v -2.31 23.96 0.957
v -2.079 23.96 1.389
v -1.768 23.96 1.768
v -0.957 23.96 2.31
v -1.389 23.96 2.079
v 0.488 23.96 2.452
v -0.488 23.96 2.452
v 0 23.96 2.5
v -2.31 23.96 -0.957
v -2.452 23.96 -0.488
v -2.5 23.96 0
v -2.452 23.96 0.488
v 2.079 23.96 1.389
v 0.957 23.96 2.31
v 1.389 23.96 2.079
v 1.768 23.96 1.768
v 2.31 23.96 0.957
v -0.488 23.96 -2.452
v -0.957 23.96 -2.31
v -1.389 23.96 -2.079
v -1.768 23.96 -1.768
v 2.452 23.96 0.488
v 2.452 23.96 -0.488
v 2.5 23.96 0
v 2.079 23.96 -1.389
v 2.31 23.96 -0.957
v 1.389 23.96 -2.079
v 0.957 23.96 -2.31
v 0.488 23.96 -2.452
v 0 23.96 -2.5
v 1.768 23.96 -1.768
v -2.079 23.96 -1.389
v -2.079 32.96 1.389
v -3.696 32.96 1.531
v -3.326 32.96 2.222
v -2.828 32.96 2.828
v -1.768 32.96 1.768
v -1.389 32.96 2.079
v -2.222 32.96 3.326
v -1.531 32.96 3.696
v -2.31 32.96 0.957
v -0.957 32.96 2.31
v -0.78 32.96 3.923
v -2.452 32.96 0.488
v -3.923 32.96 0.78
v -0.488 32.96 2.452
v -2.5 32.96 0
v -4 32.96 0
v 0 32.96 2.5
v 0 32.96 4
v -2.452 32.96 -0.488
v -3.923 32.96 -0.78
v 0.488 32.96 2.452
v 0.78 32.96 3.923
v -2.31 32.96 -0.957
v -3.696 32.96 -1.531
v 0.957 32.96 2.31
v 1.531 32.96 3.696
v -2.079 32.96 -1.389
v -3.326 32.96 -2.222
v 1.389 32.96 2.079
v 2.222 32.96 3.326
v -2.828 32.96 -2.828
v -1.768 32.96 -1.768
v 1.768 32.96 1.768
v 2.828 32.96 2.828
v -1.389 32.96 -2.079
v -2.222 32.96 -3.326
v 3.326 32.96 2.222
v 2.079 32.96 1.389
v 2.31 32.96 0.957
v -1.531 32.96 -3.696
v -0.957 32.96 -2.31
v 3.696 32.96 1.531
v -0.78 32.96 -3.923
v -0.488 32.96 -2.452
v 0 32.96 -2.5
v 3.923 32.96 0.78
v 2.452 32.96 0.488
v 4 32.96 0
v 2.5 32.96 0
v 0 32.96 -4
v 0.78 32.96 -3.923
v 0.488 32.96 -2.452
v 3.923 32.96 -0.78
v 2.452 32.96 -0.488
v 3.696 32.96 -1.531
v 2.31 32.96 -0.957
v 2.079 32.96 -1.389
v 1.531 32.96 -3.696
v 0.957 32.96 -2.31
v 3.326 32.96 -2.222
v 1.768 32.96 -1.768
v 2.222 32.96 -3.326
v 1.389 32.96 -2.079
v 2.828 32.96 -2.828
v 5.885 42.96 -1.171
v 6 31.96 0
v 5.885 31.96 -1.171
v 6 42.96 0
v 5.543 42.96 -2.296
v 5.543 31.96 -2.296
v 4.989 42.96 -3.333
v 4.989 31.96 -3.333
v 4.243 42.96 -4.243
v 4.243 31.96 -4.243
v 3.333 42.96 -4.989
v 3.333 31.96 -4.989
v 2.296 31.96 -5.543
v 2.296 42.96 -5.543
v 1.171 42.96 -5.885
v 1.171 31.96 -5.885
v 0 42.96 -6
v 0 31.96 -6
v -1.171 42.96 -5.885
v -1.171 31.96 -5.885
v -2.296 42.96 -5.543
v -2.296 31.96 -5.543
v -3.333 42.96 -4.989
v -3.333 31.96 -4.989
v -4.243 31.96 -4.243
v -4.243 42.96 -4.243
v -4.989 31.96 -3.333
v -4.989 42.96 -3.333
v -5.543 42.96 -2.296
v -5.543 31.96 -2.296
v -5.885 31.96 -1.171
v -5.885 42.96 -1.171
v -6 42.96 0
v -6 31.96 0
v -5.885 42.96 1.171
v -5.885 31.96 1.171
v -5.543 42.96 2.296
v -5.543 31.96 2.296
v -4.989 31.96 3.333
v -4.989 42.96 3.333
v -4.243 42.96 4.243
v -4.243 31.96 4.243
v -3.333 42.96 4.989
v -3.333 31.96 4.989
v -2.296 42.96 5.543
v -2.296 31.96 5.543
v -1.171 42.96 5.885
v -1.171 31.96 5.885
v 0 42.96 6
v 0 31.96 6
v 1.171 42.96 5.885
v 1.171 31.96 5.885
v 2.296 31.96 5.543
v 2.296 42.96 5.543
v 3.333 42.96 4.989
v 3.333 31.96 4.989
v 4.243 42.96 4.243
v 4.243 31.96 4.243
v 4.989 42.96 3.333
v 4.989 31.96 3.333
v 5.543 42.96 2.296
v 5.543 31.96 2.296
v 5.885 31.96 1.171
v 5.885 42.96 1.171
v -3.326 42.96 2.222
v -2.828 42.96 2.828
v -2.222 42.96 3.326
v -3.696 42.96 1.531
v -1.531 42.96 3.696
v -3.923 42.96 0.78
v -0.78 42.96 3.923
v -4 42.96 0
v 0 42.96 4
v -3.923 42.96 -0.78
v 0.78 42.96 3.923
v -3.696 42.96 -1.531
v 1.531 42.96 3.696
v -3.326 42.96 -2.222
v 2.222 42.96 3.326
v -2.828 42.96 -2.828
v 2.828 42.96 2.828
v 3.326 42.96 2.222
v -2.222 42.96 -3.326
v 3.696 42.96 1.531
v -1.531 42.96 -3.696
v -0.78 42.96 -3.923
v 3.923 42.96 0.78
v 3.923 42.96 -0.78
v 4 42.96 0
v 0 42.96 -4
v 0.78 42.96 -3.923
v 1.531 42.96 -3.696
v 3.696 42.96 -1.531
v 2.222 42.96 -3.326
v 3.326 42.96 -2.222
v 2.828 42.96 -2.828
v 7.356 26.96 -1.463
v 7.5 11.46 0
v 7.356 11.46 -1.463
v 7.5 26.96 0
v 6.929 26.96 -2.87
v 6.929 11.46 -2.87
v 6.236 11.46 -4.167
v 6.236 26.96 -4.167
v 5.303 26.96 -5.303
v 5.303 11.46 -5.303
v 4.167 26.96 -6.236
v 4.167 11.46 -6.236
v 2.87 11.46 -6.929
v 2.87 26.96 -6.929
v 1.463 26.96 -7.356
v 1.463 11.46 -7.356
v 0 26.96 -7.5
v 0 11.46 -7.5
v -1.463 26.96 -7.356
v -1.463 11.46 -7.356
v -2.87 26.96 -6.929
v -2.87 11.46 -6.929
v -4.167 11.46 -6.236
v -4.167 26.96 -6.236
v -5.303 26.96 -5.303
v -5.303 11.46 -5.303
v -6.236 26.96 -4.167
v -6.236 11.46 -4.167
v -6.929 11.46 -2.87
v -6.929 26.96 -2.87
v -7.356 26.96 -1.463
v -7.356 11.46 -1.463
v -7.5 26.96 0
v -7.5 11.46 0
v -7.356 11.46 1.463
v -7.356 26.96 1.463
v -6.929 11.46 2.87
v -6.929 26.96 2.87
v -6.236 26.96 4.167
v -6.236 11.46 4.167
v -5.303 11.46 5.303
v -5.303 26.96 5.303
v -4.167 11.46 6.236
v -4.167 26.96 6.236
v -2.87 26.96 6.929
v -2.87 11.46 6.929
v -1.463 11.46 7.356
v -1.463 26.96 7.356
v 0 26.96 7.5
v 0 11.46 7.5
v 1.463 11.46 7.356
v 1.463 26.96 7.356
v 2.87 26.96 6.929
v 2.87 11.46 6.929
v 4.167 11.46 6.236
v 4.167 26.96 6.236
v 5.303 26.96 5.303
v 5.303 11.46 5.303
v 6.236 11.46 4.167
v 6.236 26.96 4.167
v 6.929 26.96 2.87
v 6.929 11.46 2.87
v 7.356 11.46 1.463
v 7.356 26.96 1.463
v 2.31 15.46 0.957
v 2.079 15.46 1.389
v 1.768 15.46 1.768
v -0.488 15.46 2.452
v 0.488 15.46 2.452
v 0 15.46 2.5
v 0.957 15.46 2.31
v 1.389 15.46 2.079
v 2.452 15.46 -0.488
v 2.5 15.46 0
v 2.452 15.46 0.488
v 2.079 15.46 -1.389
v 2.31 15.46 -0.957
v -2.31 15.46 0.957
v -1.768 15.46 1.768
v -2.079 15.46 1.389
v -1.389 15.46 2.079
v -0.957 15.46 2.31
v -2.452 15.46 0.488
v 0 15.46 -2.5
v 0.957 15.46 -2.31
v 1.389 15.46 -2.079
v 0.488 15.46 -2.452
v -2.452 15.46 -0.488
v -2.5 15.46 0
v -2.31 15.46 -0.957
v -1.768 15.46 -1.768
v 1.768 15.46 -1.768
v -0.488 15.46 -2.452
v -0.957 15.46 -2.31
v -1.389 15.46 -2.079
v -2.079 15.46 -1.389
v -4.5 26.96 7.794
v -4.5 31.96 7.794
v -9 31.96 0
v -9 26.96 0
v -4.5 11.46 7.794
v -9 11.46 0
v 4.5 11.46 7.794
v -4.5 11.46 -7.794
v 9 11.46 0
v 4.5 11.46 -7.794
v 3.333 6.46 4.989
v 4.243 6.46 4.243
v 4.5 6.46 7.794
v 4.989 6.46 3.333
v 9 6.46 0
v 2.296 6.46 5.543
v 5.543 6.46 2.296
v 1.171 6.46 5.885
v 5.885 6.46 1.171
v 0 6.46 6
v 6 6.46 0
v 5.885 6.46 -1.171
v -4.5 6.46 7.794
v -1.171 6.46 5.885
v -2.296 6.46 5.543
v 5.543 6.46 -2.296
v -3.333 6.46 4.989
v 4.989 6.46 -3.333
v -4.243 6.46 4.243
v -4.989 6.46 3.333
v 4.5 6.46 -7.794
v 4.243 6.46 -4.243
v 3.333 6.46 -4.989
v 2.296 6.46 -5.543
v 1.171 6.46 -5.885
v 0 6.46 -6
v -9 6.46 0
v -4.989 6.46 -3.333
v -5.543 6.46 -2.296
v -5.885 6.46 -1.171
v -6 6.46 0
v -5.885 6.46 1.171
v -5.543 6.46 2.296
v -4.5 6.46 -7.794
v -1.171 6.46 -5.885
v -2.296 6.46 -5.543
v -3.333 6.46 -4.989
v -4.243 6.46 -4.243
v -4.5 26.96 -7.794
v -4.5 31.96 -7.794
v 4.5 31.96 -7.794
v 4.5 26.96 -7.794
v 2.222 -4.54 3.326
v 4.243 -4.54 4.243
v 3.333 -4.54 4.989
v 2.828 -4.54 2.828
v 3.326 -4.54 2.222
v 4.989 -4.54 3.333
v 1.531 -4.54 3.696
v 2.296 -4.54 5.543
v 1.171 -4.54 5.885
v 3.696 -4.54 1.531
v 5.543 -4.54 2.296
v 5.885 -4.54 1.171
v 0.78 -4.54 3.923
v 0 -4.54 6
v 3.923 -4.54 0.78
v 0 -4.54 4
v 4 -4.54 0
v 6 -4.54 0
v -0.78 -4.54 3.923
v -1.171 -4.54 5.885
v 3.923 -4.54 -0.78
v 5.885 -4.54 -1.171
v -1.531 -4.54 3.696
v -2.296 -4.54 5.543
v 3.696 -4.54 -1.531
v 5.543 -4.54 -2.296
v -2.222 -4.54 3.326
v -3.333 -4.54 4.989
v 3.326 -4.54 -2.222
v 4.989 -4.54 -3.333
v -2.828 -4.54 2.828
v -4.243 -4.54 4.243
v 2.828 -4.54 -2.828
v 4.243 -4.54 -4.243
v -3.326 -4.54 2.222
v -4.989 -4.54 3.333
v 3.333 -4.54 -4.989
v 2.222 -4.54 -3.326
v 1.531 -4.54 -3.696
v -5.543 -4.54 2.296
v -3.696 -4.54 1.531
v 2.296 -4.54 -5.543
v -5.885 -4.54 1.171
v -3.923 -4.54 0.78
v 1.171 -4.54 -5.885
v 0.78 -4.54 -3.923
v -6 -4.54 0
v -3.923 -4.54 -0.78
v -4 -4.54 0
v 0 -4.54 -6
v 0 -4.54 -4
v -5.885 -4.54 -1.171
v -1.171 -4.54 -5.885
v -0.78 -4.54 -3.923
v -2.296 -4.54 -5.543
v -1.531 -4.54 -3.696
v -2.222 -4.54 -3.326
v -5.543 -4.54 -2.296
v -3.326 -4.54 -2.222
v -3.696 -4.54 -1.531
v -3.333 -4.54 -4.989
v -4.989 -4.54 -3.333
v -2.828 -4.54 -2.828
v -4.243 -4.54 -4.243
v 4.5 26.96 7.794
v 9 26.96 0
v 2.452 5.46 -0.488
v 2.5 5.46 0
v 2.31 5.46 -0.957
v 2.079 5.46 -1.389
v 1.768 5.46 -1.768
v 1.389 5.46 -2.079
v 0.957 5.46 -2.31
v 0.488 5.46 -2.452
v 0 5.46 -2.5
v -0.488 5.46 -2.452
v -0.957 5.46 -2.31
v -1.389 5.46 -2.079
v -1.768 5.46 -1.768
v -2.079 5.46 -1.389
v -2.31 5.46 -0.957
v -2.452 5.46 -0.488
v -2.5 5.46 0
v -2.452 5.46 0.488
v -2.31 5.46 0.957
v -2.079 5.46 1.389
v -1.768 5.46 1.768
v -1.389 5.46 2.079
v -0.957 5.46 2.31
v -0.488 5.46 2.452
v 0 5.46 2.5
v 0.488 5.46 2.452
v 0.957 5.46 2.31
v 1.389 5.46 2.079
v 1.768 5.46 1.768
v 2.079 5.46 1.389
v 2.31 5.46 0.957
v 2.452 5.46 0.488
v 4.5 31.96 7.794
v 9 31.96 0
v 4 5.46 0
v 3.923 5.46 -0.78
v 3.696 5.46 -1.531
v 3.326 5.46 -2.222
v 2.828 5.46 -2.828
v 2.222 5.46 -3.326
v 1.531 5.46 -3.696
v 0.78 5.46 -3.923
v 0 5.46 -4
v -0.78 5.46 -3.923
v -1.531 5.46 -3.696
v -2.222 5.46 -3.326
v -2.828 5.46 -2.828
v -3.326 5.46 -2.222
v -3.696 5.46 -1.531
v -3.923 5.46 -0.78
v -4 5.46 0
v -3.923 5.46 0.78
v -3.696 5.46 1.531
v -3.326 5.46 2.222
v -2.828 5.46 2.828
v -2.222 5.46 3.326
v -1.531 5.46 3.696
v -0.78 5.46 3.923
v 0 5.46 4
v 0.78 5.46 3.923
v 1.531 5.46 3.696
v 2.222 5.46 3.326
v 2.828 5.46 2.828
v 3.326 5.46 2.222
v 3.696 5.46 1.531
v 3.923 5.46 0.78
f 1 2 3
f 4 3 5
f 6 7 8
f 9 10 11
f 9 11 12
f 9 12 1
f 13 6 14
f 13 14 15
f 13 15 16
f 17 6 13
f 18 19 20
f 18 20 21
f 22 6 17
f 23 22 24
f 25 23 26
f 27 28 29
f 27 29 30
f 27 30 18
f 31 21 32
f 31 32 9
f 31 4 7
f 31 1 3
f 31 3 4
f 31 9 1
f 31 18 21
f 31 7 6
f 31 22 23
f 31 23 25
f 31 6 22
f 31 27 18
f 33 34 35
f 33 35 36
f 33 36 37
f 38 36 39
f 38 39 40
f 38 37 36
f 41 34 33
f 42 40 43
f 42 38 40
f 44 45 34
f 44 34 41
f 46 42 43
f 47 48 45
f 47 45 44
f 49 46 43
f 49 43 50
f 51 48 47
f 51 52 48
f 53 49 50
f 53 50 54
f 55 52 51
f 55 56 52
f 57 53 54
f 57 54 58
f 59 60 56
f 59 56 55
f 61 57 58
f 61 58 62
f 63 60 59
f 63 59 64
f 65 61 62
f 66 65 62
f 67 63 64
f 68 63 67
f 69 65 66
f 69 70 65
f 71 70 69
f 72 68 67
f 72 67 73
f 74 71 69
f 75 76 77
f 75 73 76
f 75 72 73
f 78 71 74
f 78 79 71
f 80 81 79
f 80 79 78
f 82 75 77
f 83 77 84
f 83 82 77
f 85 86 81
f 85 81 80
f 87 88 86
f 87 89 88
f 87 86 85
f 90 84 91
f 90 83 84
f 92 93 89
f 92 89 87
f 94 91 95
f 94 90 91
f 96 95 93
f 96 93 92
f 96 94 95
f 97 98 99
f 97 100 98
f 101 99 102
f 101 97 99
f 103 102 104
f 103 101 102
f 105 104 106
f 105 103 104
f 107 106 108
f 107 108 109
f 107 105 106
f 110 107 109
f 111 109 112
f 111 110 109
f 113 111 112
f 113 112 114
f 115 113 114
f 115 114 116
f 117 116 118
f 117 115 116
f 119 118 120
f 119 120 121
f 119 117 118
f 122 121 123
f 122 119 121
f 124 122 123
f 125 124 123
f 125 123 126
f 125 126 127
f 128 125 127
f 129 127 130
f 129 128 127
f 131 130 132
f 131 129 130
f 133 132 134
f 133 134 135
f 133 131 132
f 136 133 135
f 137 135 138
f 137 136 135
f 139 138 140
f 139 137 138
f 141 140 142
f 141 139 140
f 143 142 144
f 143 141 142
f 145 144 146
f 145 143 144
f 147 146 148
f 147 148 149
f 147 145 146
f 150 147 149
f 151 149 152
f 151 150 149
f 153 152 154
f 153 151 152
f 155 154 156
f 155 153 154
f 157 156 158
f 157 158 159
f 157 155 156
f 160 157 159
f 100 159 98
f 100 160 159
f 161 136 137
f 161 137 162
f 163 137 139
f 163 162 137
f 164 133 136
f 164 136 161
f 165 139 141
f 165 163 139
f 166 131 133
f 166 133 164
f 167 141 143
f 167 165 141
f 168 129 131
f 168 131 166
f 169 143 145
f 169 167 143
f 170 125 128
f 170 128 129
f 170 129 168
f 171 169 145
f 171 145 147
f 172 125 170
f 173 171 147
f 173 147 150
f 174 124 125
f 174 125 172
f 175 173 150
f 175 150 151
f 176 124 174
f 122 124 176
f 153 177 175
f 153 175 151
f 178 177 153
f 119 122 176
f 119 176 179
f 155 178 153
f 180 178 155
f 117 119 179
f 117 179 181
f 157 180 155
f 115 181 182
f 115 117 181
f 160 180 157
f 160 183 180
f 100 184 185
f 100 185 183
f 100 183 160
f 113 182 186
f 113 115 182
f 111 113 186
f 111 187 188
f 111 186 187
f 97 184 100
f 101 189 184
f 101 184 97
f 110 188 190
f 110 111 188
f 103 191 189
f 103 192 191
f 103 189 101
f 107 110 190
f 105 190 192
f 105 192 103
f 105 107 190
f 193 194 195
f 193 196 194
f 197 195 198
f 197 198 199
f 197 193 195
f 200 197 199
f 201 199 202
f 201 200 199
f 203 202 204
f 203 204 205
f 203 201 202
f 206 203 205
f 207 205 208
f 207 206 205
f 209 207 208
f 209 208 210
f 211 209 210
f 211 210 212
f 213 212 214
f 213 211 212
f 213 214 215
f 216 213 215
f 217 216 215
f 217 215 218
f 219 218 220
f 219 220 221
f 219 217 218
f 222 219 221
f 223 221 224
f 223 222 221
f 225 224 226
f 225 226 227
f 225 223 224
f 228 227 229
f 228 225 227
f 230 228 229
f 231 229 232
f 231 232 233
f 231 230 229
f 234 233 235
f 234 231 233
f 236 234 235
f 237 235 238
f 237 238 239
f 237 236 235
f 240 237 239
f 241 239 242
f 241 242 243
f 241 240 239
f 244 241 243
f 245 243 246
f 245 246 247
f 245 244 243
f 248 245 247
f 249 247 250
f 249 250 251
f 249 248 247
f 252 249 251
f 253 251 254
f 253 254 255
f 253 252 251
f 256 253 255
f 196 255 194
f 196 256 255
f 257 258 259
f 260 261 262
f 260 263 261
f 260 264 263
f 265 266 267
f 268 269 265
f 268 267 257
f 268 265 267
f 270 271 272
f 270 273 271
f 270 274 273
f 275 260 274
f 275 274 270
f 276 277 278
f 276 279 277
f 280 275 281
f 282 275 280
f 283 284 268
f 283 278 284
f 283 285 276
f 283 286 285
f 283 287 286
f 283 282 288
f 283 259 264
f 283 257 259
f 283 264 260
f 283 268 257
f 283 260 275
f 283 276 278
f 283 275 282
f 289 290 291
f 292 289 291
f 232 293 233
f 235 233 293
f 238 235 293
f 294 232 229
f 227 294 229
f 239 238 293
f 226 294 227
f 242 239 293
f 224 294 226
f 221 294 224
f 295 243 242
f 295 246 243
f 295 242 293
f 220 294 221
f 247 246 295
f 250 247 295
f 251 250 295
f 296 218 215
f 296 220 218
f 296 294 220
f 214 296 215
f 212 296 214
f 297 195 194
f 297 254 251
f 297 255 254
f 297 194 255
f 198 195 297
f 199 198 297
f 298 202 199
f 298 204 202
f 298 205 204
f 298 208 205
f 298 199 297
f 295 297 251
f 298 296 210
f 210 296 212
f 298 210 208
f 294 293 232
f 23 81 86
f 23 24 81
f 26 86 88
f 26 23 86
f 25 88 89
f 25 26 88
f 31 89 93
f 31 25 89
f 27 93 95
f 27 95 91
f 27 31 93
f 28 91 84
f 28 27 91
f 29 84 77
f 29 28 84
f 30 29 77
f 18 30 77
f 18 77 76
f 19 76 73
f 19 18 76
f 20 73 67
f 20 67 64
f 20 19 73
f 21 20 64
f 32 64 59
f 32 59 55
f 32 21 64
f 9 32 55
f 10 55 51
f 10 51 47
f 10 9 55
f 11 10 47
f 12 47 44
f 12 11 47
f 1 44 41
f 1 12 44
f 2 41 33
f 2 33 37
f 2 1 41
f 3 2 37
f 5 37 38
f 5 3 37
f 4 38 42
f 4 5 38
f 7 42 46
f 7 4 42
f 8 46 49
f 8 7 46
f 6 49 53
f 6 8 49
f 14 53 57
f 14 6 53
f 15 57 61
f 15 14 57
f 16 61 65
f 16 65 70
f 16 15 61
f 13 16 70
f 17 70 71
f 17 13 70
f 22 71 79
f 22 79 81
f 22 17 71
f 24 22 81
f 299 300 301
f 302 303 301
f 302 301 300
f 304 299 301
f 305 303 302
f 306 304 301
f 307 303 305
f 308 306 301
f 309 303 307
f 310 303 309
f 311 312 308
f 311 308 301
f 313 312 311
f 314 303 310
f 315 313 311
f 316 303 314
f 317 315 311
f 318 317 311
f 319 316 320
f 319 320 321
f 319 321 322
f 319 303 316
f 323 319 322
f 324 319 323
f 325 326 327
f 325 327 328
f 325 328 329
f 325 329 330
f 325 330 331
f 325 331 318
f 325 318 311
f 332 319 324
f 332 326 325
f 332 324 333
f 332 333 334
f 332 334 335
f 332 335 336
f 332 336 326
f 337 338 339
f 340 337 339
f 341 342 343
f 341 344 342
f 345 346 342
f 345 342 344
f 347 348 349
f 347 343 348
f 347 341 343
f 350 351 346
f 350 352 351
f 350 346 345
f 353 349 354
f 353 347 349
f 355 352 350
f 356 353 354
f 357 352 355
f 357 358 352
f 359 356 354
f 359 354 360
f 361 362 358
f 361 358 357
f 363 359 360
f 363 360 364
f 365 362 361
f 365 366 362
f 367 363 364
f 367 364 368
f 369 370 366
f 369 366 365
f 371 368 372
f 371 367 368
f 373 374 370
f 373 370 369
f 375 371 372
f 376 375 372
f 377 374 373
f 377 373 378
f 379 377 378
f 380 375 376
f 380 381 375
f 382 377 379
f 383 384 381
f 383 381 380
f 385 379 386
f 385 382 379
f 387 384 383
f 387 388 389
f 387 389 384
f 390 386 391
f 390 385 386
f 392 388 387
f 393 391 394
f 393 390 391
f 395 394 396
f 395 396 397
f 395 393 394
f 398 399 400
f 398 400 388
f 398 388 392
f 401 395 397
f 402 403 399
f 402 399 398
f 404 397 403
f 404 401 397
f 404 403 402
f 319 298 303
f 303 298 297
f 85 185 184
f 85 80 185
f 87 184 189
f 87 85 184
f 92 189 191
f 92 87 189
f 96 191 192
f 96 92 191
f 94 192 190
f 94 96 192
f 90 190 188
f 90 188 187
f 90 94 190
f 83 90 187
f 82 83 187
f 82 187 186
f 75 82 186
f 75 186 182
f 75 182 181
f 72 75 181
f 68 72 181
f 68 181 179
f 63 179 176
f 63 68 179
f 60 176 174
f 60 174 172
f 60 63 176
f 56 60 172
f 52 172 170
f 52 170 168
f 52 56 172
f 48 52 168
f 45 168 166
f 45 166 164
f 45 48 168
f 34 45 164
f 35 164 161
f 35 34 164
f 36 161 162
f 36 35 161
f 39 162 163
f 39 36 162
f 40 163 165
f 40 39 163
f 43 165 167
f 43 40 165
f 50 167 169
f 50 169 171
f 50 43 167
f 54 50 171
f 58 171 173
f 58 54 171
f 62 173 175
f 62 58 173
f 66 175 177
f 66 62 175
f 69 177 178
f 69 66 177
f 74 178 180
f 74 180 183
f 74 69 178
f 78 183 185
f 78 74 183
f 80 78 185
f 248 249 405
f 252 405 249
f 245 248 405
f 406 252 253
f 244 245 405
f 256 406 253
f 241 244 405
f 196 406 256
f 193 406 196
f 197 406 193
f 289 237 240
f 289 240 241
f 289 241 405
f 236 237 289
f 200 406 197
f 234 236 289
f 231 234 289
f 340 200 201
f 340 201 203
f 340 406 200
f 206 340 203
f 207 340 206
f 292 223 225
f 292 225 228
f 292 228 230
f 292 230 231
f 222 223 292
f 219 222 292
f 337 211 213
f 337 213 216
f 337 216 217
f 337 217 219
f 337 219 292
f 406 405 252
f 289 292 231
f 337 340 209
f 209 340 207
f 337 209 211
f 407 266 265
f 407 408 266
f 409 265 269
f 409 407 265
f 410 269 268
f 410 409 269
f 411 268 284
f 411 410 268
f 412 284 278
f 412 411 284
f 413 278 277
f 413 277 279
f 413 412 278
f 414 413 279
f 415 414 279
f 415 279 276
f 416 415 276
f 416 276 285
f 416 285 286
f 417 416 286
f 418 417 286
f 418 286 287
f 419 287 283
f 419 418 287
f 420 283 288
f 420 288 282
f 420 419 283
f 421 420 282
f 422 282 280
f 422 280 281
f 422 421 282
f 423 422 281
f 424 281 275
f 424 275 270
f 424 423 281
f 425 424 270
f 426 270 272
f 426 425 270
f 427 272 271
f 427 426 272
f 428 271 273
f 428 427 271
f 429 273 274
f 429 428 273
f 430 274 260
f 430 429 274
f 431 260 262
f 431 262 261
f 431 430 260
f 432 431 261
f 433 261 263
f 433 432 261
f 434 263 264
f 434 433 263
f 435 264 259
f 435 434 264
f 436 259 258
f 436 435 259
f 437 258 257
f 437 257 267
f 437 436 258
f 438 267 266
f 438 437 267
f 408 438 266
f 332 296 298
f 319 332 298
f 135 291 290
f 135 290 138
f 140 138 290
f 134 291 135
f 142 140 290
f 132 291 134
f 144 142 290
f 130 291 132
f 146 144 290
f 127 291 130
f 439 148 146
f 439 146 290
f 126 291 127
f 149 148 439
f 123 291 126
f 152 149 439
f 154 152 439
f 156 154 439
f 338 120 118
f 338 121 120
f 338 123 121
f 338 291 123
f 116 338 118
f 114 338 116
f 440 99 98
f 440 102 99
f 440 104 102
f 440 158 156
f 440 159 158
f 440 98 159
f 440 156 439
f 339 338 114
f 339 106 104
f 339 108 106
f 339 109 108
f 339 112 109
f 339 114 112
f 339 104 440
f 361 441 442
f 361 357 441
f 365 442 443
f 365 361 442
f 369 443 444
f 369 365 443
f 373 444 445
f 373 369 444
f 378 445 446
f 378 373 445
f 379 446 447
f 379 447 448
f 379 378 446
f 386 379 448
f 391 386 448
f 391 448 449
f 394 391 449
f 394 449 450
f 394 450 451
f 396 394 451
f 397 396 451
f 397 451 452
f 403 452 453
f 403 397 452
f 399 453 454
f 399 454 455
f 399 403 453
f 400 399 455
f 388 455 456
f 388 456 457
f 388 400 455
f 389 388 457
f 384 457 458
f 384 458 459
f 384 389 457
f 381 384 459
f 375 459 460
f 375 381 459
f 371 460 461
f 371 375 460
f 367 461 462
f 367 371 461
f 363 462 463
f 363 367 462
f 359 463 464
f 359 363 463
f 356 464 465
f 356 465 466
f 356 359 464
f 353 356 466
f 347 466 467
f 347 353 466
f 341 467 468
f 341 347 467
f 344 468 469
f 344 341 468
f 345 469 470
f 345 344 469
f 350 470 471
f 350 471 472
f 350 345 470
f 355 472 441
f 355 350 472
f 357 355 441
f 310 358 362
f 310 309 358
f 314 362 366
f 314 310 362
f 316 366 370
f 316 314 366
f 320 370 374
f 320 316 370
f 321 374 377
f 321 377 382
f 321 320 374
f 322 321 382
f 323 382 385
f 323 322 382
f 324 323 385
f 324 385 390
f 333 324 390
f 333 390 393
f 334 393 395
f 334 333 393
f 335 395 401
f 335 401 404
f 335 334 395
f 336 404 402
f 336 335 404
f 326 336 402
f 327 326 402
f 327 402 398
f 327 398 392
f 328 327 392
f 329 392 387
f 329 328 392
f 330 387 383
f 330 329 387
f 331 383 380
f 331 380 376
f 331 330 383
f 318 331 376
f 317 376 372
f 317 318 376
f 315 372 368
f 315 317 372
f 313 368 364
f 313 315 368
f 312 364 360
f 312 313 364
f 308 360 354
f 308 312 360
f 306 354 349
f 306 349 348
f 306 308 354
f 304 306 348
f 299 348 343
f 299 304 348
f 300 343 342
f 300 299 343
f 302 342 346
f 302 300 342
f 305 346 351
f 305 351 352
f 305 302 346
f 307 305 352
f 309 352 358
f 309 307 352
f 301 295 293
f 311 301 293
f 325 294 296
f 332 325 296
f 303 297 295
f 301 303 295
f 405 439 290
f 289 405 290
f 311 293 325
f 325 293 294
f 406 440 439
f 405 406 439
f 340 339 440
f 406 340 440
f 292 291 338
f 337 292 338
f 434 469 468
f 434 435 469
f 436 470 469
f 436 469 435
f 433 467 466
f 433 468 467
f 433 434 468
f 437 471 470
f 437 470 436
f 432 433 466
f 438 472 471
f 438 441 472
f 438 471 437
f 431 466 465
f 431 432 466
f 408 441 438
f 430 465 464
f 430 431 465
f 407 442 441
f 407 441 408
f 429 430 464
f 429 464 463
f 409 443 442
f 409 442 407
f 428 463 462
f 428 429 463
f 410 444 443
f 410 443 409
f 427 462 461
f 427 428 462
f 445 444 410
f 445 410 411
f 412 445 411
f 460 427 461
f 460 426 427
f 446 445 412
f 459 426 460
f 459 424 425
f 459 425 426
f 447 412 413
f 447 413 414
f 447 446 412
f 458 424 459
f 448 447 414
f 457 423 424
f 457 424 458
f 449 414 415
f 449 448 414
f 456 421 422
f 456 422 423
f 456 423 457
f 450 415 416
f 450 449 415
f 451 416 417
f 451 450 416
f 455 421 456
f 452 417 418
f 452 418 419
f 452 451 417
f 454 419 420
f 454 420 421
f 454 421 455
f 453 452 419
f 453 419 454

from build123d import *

# Parameters (mm, degrees)
CUT_EXTRUDE_1_DEPTH = 30


with BuildPart() as part:
    # Эскиз2 → Повернуть1 (revolve)
    with BuildSketch(Plane.XY):
        Polygon((4, -4.539806968), (6, -4.539806968), (6, 6.460193032), (9, 6.460193032), (9, 11.460193032), (7.5, 11.460193032), (7.5, 26.960193032), (9, 26.960193032), (9, 31.960193032), (6, 31.960193032), (6, 42.960193032), (4, 42.960193032), (4, 32.960193032), (2.5, 32.960193032), (2.5, 23.960193032), (0, 23.960193032), (0, 15.460193032), (2.5, 15.460193032), (2.5, 5.460193032), (4, 5.460193032), align=None)
    revolve(axis=Axis((0, 15.460193032, 0), (0, 1, 0)))

    # Эскиз3 → Вырез-Вытянуть1 (cut)
    with BuildSketch(Plane(origin=(0, 31.960193032, 0), x_dir=(1, 0, 0), z_dir=(0, 1, 0))):
        with BuildLine():
            Line((-9, 0), (-4.5, 7.794228634))
            ThreePointArc((-4.5, 7.794228634), (-7.794228634, 4.5), (-9, 0))
        make_face()
        with BuildLine():
            Line((-4.5, 7.794228634), (4.5, 7.794228634))
            ThreePointArc((4.5, 7.794228634), (0, 9), (-4.5, 7.794228634))
        make_face()
        with BuildLine():
            Line((4.5, 7.794228634), (9, 0))
            ThreePointArc((9, 0), (7.794228634, 4.5), (4.5, 7.794228634))
        make_face()
        with BuildLine():
            ThreePointArc((4.5, -7.794228634), (7.794228634, -4.5), (9, 0))
            Line((9, 0), (4.5, -7.794228634))
        make_face()
        with BuildLine():
            ThreePointArc((-4.5, -7.794228634), (0, -9), (4.5, -7.794228634))
            Line((4.5, -7.794228634), (-4.5, -7.794228634))
        make_face()
        with BuildLine():
            ThreePointArc((-9, 0), (-7.794228634, -4.5), (-4.5, -7.794228634))
            Line((-4.5, -7.794228634), (-9, 0))
        make_face()
    extrude(amount=-CUT_EXTRUDE_1_DEPTH, mode=Mode.SUBTRACT)


solid = part.part
